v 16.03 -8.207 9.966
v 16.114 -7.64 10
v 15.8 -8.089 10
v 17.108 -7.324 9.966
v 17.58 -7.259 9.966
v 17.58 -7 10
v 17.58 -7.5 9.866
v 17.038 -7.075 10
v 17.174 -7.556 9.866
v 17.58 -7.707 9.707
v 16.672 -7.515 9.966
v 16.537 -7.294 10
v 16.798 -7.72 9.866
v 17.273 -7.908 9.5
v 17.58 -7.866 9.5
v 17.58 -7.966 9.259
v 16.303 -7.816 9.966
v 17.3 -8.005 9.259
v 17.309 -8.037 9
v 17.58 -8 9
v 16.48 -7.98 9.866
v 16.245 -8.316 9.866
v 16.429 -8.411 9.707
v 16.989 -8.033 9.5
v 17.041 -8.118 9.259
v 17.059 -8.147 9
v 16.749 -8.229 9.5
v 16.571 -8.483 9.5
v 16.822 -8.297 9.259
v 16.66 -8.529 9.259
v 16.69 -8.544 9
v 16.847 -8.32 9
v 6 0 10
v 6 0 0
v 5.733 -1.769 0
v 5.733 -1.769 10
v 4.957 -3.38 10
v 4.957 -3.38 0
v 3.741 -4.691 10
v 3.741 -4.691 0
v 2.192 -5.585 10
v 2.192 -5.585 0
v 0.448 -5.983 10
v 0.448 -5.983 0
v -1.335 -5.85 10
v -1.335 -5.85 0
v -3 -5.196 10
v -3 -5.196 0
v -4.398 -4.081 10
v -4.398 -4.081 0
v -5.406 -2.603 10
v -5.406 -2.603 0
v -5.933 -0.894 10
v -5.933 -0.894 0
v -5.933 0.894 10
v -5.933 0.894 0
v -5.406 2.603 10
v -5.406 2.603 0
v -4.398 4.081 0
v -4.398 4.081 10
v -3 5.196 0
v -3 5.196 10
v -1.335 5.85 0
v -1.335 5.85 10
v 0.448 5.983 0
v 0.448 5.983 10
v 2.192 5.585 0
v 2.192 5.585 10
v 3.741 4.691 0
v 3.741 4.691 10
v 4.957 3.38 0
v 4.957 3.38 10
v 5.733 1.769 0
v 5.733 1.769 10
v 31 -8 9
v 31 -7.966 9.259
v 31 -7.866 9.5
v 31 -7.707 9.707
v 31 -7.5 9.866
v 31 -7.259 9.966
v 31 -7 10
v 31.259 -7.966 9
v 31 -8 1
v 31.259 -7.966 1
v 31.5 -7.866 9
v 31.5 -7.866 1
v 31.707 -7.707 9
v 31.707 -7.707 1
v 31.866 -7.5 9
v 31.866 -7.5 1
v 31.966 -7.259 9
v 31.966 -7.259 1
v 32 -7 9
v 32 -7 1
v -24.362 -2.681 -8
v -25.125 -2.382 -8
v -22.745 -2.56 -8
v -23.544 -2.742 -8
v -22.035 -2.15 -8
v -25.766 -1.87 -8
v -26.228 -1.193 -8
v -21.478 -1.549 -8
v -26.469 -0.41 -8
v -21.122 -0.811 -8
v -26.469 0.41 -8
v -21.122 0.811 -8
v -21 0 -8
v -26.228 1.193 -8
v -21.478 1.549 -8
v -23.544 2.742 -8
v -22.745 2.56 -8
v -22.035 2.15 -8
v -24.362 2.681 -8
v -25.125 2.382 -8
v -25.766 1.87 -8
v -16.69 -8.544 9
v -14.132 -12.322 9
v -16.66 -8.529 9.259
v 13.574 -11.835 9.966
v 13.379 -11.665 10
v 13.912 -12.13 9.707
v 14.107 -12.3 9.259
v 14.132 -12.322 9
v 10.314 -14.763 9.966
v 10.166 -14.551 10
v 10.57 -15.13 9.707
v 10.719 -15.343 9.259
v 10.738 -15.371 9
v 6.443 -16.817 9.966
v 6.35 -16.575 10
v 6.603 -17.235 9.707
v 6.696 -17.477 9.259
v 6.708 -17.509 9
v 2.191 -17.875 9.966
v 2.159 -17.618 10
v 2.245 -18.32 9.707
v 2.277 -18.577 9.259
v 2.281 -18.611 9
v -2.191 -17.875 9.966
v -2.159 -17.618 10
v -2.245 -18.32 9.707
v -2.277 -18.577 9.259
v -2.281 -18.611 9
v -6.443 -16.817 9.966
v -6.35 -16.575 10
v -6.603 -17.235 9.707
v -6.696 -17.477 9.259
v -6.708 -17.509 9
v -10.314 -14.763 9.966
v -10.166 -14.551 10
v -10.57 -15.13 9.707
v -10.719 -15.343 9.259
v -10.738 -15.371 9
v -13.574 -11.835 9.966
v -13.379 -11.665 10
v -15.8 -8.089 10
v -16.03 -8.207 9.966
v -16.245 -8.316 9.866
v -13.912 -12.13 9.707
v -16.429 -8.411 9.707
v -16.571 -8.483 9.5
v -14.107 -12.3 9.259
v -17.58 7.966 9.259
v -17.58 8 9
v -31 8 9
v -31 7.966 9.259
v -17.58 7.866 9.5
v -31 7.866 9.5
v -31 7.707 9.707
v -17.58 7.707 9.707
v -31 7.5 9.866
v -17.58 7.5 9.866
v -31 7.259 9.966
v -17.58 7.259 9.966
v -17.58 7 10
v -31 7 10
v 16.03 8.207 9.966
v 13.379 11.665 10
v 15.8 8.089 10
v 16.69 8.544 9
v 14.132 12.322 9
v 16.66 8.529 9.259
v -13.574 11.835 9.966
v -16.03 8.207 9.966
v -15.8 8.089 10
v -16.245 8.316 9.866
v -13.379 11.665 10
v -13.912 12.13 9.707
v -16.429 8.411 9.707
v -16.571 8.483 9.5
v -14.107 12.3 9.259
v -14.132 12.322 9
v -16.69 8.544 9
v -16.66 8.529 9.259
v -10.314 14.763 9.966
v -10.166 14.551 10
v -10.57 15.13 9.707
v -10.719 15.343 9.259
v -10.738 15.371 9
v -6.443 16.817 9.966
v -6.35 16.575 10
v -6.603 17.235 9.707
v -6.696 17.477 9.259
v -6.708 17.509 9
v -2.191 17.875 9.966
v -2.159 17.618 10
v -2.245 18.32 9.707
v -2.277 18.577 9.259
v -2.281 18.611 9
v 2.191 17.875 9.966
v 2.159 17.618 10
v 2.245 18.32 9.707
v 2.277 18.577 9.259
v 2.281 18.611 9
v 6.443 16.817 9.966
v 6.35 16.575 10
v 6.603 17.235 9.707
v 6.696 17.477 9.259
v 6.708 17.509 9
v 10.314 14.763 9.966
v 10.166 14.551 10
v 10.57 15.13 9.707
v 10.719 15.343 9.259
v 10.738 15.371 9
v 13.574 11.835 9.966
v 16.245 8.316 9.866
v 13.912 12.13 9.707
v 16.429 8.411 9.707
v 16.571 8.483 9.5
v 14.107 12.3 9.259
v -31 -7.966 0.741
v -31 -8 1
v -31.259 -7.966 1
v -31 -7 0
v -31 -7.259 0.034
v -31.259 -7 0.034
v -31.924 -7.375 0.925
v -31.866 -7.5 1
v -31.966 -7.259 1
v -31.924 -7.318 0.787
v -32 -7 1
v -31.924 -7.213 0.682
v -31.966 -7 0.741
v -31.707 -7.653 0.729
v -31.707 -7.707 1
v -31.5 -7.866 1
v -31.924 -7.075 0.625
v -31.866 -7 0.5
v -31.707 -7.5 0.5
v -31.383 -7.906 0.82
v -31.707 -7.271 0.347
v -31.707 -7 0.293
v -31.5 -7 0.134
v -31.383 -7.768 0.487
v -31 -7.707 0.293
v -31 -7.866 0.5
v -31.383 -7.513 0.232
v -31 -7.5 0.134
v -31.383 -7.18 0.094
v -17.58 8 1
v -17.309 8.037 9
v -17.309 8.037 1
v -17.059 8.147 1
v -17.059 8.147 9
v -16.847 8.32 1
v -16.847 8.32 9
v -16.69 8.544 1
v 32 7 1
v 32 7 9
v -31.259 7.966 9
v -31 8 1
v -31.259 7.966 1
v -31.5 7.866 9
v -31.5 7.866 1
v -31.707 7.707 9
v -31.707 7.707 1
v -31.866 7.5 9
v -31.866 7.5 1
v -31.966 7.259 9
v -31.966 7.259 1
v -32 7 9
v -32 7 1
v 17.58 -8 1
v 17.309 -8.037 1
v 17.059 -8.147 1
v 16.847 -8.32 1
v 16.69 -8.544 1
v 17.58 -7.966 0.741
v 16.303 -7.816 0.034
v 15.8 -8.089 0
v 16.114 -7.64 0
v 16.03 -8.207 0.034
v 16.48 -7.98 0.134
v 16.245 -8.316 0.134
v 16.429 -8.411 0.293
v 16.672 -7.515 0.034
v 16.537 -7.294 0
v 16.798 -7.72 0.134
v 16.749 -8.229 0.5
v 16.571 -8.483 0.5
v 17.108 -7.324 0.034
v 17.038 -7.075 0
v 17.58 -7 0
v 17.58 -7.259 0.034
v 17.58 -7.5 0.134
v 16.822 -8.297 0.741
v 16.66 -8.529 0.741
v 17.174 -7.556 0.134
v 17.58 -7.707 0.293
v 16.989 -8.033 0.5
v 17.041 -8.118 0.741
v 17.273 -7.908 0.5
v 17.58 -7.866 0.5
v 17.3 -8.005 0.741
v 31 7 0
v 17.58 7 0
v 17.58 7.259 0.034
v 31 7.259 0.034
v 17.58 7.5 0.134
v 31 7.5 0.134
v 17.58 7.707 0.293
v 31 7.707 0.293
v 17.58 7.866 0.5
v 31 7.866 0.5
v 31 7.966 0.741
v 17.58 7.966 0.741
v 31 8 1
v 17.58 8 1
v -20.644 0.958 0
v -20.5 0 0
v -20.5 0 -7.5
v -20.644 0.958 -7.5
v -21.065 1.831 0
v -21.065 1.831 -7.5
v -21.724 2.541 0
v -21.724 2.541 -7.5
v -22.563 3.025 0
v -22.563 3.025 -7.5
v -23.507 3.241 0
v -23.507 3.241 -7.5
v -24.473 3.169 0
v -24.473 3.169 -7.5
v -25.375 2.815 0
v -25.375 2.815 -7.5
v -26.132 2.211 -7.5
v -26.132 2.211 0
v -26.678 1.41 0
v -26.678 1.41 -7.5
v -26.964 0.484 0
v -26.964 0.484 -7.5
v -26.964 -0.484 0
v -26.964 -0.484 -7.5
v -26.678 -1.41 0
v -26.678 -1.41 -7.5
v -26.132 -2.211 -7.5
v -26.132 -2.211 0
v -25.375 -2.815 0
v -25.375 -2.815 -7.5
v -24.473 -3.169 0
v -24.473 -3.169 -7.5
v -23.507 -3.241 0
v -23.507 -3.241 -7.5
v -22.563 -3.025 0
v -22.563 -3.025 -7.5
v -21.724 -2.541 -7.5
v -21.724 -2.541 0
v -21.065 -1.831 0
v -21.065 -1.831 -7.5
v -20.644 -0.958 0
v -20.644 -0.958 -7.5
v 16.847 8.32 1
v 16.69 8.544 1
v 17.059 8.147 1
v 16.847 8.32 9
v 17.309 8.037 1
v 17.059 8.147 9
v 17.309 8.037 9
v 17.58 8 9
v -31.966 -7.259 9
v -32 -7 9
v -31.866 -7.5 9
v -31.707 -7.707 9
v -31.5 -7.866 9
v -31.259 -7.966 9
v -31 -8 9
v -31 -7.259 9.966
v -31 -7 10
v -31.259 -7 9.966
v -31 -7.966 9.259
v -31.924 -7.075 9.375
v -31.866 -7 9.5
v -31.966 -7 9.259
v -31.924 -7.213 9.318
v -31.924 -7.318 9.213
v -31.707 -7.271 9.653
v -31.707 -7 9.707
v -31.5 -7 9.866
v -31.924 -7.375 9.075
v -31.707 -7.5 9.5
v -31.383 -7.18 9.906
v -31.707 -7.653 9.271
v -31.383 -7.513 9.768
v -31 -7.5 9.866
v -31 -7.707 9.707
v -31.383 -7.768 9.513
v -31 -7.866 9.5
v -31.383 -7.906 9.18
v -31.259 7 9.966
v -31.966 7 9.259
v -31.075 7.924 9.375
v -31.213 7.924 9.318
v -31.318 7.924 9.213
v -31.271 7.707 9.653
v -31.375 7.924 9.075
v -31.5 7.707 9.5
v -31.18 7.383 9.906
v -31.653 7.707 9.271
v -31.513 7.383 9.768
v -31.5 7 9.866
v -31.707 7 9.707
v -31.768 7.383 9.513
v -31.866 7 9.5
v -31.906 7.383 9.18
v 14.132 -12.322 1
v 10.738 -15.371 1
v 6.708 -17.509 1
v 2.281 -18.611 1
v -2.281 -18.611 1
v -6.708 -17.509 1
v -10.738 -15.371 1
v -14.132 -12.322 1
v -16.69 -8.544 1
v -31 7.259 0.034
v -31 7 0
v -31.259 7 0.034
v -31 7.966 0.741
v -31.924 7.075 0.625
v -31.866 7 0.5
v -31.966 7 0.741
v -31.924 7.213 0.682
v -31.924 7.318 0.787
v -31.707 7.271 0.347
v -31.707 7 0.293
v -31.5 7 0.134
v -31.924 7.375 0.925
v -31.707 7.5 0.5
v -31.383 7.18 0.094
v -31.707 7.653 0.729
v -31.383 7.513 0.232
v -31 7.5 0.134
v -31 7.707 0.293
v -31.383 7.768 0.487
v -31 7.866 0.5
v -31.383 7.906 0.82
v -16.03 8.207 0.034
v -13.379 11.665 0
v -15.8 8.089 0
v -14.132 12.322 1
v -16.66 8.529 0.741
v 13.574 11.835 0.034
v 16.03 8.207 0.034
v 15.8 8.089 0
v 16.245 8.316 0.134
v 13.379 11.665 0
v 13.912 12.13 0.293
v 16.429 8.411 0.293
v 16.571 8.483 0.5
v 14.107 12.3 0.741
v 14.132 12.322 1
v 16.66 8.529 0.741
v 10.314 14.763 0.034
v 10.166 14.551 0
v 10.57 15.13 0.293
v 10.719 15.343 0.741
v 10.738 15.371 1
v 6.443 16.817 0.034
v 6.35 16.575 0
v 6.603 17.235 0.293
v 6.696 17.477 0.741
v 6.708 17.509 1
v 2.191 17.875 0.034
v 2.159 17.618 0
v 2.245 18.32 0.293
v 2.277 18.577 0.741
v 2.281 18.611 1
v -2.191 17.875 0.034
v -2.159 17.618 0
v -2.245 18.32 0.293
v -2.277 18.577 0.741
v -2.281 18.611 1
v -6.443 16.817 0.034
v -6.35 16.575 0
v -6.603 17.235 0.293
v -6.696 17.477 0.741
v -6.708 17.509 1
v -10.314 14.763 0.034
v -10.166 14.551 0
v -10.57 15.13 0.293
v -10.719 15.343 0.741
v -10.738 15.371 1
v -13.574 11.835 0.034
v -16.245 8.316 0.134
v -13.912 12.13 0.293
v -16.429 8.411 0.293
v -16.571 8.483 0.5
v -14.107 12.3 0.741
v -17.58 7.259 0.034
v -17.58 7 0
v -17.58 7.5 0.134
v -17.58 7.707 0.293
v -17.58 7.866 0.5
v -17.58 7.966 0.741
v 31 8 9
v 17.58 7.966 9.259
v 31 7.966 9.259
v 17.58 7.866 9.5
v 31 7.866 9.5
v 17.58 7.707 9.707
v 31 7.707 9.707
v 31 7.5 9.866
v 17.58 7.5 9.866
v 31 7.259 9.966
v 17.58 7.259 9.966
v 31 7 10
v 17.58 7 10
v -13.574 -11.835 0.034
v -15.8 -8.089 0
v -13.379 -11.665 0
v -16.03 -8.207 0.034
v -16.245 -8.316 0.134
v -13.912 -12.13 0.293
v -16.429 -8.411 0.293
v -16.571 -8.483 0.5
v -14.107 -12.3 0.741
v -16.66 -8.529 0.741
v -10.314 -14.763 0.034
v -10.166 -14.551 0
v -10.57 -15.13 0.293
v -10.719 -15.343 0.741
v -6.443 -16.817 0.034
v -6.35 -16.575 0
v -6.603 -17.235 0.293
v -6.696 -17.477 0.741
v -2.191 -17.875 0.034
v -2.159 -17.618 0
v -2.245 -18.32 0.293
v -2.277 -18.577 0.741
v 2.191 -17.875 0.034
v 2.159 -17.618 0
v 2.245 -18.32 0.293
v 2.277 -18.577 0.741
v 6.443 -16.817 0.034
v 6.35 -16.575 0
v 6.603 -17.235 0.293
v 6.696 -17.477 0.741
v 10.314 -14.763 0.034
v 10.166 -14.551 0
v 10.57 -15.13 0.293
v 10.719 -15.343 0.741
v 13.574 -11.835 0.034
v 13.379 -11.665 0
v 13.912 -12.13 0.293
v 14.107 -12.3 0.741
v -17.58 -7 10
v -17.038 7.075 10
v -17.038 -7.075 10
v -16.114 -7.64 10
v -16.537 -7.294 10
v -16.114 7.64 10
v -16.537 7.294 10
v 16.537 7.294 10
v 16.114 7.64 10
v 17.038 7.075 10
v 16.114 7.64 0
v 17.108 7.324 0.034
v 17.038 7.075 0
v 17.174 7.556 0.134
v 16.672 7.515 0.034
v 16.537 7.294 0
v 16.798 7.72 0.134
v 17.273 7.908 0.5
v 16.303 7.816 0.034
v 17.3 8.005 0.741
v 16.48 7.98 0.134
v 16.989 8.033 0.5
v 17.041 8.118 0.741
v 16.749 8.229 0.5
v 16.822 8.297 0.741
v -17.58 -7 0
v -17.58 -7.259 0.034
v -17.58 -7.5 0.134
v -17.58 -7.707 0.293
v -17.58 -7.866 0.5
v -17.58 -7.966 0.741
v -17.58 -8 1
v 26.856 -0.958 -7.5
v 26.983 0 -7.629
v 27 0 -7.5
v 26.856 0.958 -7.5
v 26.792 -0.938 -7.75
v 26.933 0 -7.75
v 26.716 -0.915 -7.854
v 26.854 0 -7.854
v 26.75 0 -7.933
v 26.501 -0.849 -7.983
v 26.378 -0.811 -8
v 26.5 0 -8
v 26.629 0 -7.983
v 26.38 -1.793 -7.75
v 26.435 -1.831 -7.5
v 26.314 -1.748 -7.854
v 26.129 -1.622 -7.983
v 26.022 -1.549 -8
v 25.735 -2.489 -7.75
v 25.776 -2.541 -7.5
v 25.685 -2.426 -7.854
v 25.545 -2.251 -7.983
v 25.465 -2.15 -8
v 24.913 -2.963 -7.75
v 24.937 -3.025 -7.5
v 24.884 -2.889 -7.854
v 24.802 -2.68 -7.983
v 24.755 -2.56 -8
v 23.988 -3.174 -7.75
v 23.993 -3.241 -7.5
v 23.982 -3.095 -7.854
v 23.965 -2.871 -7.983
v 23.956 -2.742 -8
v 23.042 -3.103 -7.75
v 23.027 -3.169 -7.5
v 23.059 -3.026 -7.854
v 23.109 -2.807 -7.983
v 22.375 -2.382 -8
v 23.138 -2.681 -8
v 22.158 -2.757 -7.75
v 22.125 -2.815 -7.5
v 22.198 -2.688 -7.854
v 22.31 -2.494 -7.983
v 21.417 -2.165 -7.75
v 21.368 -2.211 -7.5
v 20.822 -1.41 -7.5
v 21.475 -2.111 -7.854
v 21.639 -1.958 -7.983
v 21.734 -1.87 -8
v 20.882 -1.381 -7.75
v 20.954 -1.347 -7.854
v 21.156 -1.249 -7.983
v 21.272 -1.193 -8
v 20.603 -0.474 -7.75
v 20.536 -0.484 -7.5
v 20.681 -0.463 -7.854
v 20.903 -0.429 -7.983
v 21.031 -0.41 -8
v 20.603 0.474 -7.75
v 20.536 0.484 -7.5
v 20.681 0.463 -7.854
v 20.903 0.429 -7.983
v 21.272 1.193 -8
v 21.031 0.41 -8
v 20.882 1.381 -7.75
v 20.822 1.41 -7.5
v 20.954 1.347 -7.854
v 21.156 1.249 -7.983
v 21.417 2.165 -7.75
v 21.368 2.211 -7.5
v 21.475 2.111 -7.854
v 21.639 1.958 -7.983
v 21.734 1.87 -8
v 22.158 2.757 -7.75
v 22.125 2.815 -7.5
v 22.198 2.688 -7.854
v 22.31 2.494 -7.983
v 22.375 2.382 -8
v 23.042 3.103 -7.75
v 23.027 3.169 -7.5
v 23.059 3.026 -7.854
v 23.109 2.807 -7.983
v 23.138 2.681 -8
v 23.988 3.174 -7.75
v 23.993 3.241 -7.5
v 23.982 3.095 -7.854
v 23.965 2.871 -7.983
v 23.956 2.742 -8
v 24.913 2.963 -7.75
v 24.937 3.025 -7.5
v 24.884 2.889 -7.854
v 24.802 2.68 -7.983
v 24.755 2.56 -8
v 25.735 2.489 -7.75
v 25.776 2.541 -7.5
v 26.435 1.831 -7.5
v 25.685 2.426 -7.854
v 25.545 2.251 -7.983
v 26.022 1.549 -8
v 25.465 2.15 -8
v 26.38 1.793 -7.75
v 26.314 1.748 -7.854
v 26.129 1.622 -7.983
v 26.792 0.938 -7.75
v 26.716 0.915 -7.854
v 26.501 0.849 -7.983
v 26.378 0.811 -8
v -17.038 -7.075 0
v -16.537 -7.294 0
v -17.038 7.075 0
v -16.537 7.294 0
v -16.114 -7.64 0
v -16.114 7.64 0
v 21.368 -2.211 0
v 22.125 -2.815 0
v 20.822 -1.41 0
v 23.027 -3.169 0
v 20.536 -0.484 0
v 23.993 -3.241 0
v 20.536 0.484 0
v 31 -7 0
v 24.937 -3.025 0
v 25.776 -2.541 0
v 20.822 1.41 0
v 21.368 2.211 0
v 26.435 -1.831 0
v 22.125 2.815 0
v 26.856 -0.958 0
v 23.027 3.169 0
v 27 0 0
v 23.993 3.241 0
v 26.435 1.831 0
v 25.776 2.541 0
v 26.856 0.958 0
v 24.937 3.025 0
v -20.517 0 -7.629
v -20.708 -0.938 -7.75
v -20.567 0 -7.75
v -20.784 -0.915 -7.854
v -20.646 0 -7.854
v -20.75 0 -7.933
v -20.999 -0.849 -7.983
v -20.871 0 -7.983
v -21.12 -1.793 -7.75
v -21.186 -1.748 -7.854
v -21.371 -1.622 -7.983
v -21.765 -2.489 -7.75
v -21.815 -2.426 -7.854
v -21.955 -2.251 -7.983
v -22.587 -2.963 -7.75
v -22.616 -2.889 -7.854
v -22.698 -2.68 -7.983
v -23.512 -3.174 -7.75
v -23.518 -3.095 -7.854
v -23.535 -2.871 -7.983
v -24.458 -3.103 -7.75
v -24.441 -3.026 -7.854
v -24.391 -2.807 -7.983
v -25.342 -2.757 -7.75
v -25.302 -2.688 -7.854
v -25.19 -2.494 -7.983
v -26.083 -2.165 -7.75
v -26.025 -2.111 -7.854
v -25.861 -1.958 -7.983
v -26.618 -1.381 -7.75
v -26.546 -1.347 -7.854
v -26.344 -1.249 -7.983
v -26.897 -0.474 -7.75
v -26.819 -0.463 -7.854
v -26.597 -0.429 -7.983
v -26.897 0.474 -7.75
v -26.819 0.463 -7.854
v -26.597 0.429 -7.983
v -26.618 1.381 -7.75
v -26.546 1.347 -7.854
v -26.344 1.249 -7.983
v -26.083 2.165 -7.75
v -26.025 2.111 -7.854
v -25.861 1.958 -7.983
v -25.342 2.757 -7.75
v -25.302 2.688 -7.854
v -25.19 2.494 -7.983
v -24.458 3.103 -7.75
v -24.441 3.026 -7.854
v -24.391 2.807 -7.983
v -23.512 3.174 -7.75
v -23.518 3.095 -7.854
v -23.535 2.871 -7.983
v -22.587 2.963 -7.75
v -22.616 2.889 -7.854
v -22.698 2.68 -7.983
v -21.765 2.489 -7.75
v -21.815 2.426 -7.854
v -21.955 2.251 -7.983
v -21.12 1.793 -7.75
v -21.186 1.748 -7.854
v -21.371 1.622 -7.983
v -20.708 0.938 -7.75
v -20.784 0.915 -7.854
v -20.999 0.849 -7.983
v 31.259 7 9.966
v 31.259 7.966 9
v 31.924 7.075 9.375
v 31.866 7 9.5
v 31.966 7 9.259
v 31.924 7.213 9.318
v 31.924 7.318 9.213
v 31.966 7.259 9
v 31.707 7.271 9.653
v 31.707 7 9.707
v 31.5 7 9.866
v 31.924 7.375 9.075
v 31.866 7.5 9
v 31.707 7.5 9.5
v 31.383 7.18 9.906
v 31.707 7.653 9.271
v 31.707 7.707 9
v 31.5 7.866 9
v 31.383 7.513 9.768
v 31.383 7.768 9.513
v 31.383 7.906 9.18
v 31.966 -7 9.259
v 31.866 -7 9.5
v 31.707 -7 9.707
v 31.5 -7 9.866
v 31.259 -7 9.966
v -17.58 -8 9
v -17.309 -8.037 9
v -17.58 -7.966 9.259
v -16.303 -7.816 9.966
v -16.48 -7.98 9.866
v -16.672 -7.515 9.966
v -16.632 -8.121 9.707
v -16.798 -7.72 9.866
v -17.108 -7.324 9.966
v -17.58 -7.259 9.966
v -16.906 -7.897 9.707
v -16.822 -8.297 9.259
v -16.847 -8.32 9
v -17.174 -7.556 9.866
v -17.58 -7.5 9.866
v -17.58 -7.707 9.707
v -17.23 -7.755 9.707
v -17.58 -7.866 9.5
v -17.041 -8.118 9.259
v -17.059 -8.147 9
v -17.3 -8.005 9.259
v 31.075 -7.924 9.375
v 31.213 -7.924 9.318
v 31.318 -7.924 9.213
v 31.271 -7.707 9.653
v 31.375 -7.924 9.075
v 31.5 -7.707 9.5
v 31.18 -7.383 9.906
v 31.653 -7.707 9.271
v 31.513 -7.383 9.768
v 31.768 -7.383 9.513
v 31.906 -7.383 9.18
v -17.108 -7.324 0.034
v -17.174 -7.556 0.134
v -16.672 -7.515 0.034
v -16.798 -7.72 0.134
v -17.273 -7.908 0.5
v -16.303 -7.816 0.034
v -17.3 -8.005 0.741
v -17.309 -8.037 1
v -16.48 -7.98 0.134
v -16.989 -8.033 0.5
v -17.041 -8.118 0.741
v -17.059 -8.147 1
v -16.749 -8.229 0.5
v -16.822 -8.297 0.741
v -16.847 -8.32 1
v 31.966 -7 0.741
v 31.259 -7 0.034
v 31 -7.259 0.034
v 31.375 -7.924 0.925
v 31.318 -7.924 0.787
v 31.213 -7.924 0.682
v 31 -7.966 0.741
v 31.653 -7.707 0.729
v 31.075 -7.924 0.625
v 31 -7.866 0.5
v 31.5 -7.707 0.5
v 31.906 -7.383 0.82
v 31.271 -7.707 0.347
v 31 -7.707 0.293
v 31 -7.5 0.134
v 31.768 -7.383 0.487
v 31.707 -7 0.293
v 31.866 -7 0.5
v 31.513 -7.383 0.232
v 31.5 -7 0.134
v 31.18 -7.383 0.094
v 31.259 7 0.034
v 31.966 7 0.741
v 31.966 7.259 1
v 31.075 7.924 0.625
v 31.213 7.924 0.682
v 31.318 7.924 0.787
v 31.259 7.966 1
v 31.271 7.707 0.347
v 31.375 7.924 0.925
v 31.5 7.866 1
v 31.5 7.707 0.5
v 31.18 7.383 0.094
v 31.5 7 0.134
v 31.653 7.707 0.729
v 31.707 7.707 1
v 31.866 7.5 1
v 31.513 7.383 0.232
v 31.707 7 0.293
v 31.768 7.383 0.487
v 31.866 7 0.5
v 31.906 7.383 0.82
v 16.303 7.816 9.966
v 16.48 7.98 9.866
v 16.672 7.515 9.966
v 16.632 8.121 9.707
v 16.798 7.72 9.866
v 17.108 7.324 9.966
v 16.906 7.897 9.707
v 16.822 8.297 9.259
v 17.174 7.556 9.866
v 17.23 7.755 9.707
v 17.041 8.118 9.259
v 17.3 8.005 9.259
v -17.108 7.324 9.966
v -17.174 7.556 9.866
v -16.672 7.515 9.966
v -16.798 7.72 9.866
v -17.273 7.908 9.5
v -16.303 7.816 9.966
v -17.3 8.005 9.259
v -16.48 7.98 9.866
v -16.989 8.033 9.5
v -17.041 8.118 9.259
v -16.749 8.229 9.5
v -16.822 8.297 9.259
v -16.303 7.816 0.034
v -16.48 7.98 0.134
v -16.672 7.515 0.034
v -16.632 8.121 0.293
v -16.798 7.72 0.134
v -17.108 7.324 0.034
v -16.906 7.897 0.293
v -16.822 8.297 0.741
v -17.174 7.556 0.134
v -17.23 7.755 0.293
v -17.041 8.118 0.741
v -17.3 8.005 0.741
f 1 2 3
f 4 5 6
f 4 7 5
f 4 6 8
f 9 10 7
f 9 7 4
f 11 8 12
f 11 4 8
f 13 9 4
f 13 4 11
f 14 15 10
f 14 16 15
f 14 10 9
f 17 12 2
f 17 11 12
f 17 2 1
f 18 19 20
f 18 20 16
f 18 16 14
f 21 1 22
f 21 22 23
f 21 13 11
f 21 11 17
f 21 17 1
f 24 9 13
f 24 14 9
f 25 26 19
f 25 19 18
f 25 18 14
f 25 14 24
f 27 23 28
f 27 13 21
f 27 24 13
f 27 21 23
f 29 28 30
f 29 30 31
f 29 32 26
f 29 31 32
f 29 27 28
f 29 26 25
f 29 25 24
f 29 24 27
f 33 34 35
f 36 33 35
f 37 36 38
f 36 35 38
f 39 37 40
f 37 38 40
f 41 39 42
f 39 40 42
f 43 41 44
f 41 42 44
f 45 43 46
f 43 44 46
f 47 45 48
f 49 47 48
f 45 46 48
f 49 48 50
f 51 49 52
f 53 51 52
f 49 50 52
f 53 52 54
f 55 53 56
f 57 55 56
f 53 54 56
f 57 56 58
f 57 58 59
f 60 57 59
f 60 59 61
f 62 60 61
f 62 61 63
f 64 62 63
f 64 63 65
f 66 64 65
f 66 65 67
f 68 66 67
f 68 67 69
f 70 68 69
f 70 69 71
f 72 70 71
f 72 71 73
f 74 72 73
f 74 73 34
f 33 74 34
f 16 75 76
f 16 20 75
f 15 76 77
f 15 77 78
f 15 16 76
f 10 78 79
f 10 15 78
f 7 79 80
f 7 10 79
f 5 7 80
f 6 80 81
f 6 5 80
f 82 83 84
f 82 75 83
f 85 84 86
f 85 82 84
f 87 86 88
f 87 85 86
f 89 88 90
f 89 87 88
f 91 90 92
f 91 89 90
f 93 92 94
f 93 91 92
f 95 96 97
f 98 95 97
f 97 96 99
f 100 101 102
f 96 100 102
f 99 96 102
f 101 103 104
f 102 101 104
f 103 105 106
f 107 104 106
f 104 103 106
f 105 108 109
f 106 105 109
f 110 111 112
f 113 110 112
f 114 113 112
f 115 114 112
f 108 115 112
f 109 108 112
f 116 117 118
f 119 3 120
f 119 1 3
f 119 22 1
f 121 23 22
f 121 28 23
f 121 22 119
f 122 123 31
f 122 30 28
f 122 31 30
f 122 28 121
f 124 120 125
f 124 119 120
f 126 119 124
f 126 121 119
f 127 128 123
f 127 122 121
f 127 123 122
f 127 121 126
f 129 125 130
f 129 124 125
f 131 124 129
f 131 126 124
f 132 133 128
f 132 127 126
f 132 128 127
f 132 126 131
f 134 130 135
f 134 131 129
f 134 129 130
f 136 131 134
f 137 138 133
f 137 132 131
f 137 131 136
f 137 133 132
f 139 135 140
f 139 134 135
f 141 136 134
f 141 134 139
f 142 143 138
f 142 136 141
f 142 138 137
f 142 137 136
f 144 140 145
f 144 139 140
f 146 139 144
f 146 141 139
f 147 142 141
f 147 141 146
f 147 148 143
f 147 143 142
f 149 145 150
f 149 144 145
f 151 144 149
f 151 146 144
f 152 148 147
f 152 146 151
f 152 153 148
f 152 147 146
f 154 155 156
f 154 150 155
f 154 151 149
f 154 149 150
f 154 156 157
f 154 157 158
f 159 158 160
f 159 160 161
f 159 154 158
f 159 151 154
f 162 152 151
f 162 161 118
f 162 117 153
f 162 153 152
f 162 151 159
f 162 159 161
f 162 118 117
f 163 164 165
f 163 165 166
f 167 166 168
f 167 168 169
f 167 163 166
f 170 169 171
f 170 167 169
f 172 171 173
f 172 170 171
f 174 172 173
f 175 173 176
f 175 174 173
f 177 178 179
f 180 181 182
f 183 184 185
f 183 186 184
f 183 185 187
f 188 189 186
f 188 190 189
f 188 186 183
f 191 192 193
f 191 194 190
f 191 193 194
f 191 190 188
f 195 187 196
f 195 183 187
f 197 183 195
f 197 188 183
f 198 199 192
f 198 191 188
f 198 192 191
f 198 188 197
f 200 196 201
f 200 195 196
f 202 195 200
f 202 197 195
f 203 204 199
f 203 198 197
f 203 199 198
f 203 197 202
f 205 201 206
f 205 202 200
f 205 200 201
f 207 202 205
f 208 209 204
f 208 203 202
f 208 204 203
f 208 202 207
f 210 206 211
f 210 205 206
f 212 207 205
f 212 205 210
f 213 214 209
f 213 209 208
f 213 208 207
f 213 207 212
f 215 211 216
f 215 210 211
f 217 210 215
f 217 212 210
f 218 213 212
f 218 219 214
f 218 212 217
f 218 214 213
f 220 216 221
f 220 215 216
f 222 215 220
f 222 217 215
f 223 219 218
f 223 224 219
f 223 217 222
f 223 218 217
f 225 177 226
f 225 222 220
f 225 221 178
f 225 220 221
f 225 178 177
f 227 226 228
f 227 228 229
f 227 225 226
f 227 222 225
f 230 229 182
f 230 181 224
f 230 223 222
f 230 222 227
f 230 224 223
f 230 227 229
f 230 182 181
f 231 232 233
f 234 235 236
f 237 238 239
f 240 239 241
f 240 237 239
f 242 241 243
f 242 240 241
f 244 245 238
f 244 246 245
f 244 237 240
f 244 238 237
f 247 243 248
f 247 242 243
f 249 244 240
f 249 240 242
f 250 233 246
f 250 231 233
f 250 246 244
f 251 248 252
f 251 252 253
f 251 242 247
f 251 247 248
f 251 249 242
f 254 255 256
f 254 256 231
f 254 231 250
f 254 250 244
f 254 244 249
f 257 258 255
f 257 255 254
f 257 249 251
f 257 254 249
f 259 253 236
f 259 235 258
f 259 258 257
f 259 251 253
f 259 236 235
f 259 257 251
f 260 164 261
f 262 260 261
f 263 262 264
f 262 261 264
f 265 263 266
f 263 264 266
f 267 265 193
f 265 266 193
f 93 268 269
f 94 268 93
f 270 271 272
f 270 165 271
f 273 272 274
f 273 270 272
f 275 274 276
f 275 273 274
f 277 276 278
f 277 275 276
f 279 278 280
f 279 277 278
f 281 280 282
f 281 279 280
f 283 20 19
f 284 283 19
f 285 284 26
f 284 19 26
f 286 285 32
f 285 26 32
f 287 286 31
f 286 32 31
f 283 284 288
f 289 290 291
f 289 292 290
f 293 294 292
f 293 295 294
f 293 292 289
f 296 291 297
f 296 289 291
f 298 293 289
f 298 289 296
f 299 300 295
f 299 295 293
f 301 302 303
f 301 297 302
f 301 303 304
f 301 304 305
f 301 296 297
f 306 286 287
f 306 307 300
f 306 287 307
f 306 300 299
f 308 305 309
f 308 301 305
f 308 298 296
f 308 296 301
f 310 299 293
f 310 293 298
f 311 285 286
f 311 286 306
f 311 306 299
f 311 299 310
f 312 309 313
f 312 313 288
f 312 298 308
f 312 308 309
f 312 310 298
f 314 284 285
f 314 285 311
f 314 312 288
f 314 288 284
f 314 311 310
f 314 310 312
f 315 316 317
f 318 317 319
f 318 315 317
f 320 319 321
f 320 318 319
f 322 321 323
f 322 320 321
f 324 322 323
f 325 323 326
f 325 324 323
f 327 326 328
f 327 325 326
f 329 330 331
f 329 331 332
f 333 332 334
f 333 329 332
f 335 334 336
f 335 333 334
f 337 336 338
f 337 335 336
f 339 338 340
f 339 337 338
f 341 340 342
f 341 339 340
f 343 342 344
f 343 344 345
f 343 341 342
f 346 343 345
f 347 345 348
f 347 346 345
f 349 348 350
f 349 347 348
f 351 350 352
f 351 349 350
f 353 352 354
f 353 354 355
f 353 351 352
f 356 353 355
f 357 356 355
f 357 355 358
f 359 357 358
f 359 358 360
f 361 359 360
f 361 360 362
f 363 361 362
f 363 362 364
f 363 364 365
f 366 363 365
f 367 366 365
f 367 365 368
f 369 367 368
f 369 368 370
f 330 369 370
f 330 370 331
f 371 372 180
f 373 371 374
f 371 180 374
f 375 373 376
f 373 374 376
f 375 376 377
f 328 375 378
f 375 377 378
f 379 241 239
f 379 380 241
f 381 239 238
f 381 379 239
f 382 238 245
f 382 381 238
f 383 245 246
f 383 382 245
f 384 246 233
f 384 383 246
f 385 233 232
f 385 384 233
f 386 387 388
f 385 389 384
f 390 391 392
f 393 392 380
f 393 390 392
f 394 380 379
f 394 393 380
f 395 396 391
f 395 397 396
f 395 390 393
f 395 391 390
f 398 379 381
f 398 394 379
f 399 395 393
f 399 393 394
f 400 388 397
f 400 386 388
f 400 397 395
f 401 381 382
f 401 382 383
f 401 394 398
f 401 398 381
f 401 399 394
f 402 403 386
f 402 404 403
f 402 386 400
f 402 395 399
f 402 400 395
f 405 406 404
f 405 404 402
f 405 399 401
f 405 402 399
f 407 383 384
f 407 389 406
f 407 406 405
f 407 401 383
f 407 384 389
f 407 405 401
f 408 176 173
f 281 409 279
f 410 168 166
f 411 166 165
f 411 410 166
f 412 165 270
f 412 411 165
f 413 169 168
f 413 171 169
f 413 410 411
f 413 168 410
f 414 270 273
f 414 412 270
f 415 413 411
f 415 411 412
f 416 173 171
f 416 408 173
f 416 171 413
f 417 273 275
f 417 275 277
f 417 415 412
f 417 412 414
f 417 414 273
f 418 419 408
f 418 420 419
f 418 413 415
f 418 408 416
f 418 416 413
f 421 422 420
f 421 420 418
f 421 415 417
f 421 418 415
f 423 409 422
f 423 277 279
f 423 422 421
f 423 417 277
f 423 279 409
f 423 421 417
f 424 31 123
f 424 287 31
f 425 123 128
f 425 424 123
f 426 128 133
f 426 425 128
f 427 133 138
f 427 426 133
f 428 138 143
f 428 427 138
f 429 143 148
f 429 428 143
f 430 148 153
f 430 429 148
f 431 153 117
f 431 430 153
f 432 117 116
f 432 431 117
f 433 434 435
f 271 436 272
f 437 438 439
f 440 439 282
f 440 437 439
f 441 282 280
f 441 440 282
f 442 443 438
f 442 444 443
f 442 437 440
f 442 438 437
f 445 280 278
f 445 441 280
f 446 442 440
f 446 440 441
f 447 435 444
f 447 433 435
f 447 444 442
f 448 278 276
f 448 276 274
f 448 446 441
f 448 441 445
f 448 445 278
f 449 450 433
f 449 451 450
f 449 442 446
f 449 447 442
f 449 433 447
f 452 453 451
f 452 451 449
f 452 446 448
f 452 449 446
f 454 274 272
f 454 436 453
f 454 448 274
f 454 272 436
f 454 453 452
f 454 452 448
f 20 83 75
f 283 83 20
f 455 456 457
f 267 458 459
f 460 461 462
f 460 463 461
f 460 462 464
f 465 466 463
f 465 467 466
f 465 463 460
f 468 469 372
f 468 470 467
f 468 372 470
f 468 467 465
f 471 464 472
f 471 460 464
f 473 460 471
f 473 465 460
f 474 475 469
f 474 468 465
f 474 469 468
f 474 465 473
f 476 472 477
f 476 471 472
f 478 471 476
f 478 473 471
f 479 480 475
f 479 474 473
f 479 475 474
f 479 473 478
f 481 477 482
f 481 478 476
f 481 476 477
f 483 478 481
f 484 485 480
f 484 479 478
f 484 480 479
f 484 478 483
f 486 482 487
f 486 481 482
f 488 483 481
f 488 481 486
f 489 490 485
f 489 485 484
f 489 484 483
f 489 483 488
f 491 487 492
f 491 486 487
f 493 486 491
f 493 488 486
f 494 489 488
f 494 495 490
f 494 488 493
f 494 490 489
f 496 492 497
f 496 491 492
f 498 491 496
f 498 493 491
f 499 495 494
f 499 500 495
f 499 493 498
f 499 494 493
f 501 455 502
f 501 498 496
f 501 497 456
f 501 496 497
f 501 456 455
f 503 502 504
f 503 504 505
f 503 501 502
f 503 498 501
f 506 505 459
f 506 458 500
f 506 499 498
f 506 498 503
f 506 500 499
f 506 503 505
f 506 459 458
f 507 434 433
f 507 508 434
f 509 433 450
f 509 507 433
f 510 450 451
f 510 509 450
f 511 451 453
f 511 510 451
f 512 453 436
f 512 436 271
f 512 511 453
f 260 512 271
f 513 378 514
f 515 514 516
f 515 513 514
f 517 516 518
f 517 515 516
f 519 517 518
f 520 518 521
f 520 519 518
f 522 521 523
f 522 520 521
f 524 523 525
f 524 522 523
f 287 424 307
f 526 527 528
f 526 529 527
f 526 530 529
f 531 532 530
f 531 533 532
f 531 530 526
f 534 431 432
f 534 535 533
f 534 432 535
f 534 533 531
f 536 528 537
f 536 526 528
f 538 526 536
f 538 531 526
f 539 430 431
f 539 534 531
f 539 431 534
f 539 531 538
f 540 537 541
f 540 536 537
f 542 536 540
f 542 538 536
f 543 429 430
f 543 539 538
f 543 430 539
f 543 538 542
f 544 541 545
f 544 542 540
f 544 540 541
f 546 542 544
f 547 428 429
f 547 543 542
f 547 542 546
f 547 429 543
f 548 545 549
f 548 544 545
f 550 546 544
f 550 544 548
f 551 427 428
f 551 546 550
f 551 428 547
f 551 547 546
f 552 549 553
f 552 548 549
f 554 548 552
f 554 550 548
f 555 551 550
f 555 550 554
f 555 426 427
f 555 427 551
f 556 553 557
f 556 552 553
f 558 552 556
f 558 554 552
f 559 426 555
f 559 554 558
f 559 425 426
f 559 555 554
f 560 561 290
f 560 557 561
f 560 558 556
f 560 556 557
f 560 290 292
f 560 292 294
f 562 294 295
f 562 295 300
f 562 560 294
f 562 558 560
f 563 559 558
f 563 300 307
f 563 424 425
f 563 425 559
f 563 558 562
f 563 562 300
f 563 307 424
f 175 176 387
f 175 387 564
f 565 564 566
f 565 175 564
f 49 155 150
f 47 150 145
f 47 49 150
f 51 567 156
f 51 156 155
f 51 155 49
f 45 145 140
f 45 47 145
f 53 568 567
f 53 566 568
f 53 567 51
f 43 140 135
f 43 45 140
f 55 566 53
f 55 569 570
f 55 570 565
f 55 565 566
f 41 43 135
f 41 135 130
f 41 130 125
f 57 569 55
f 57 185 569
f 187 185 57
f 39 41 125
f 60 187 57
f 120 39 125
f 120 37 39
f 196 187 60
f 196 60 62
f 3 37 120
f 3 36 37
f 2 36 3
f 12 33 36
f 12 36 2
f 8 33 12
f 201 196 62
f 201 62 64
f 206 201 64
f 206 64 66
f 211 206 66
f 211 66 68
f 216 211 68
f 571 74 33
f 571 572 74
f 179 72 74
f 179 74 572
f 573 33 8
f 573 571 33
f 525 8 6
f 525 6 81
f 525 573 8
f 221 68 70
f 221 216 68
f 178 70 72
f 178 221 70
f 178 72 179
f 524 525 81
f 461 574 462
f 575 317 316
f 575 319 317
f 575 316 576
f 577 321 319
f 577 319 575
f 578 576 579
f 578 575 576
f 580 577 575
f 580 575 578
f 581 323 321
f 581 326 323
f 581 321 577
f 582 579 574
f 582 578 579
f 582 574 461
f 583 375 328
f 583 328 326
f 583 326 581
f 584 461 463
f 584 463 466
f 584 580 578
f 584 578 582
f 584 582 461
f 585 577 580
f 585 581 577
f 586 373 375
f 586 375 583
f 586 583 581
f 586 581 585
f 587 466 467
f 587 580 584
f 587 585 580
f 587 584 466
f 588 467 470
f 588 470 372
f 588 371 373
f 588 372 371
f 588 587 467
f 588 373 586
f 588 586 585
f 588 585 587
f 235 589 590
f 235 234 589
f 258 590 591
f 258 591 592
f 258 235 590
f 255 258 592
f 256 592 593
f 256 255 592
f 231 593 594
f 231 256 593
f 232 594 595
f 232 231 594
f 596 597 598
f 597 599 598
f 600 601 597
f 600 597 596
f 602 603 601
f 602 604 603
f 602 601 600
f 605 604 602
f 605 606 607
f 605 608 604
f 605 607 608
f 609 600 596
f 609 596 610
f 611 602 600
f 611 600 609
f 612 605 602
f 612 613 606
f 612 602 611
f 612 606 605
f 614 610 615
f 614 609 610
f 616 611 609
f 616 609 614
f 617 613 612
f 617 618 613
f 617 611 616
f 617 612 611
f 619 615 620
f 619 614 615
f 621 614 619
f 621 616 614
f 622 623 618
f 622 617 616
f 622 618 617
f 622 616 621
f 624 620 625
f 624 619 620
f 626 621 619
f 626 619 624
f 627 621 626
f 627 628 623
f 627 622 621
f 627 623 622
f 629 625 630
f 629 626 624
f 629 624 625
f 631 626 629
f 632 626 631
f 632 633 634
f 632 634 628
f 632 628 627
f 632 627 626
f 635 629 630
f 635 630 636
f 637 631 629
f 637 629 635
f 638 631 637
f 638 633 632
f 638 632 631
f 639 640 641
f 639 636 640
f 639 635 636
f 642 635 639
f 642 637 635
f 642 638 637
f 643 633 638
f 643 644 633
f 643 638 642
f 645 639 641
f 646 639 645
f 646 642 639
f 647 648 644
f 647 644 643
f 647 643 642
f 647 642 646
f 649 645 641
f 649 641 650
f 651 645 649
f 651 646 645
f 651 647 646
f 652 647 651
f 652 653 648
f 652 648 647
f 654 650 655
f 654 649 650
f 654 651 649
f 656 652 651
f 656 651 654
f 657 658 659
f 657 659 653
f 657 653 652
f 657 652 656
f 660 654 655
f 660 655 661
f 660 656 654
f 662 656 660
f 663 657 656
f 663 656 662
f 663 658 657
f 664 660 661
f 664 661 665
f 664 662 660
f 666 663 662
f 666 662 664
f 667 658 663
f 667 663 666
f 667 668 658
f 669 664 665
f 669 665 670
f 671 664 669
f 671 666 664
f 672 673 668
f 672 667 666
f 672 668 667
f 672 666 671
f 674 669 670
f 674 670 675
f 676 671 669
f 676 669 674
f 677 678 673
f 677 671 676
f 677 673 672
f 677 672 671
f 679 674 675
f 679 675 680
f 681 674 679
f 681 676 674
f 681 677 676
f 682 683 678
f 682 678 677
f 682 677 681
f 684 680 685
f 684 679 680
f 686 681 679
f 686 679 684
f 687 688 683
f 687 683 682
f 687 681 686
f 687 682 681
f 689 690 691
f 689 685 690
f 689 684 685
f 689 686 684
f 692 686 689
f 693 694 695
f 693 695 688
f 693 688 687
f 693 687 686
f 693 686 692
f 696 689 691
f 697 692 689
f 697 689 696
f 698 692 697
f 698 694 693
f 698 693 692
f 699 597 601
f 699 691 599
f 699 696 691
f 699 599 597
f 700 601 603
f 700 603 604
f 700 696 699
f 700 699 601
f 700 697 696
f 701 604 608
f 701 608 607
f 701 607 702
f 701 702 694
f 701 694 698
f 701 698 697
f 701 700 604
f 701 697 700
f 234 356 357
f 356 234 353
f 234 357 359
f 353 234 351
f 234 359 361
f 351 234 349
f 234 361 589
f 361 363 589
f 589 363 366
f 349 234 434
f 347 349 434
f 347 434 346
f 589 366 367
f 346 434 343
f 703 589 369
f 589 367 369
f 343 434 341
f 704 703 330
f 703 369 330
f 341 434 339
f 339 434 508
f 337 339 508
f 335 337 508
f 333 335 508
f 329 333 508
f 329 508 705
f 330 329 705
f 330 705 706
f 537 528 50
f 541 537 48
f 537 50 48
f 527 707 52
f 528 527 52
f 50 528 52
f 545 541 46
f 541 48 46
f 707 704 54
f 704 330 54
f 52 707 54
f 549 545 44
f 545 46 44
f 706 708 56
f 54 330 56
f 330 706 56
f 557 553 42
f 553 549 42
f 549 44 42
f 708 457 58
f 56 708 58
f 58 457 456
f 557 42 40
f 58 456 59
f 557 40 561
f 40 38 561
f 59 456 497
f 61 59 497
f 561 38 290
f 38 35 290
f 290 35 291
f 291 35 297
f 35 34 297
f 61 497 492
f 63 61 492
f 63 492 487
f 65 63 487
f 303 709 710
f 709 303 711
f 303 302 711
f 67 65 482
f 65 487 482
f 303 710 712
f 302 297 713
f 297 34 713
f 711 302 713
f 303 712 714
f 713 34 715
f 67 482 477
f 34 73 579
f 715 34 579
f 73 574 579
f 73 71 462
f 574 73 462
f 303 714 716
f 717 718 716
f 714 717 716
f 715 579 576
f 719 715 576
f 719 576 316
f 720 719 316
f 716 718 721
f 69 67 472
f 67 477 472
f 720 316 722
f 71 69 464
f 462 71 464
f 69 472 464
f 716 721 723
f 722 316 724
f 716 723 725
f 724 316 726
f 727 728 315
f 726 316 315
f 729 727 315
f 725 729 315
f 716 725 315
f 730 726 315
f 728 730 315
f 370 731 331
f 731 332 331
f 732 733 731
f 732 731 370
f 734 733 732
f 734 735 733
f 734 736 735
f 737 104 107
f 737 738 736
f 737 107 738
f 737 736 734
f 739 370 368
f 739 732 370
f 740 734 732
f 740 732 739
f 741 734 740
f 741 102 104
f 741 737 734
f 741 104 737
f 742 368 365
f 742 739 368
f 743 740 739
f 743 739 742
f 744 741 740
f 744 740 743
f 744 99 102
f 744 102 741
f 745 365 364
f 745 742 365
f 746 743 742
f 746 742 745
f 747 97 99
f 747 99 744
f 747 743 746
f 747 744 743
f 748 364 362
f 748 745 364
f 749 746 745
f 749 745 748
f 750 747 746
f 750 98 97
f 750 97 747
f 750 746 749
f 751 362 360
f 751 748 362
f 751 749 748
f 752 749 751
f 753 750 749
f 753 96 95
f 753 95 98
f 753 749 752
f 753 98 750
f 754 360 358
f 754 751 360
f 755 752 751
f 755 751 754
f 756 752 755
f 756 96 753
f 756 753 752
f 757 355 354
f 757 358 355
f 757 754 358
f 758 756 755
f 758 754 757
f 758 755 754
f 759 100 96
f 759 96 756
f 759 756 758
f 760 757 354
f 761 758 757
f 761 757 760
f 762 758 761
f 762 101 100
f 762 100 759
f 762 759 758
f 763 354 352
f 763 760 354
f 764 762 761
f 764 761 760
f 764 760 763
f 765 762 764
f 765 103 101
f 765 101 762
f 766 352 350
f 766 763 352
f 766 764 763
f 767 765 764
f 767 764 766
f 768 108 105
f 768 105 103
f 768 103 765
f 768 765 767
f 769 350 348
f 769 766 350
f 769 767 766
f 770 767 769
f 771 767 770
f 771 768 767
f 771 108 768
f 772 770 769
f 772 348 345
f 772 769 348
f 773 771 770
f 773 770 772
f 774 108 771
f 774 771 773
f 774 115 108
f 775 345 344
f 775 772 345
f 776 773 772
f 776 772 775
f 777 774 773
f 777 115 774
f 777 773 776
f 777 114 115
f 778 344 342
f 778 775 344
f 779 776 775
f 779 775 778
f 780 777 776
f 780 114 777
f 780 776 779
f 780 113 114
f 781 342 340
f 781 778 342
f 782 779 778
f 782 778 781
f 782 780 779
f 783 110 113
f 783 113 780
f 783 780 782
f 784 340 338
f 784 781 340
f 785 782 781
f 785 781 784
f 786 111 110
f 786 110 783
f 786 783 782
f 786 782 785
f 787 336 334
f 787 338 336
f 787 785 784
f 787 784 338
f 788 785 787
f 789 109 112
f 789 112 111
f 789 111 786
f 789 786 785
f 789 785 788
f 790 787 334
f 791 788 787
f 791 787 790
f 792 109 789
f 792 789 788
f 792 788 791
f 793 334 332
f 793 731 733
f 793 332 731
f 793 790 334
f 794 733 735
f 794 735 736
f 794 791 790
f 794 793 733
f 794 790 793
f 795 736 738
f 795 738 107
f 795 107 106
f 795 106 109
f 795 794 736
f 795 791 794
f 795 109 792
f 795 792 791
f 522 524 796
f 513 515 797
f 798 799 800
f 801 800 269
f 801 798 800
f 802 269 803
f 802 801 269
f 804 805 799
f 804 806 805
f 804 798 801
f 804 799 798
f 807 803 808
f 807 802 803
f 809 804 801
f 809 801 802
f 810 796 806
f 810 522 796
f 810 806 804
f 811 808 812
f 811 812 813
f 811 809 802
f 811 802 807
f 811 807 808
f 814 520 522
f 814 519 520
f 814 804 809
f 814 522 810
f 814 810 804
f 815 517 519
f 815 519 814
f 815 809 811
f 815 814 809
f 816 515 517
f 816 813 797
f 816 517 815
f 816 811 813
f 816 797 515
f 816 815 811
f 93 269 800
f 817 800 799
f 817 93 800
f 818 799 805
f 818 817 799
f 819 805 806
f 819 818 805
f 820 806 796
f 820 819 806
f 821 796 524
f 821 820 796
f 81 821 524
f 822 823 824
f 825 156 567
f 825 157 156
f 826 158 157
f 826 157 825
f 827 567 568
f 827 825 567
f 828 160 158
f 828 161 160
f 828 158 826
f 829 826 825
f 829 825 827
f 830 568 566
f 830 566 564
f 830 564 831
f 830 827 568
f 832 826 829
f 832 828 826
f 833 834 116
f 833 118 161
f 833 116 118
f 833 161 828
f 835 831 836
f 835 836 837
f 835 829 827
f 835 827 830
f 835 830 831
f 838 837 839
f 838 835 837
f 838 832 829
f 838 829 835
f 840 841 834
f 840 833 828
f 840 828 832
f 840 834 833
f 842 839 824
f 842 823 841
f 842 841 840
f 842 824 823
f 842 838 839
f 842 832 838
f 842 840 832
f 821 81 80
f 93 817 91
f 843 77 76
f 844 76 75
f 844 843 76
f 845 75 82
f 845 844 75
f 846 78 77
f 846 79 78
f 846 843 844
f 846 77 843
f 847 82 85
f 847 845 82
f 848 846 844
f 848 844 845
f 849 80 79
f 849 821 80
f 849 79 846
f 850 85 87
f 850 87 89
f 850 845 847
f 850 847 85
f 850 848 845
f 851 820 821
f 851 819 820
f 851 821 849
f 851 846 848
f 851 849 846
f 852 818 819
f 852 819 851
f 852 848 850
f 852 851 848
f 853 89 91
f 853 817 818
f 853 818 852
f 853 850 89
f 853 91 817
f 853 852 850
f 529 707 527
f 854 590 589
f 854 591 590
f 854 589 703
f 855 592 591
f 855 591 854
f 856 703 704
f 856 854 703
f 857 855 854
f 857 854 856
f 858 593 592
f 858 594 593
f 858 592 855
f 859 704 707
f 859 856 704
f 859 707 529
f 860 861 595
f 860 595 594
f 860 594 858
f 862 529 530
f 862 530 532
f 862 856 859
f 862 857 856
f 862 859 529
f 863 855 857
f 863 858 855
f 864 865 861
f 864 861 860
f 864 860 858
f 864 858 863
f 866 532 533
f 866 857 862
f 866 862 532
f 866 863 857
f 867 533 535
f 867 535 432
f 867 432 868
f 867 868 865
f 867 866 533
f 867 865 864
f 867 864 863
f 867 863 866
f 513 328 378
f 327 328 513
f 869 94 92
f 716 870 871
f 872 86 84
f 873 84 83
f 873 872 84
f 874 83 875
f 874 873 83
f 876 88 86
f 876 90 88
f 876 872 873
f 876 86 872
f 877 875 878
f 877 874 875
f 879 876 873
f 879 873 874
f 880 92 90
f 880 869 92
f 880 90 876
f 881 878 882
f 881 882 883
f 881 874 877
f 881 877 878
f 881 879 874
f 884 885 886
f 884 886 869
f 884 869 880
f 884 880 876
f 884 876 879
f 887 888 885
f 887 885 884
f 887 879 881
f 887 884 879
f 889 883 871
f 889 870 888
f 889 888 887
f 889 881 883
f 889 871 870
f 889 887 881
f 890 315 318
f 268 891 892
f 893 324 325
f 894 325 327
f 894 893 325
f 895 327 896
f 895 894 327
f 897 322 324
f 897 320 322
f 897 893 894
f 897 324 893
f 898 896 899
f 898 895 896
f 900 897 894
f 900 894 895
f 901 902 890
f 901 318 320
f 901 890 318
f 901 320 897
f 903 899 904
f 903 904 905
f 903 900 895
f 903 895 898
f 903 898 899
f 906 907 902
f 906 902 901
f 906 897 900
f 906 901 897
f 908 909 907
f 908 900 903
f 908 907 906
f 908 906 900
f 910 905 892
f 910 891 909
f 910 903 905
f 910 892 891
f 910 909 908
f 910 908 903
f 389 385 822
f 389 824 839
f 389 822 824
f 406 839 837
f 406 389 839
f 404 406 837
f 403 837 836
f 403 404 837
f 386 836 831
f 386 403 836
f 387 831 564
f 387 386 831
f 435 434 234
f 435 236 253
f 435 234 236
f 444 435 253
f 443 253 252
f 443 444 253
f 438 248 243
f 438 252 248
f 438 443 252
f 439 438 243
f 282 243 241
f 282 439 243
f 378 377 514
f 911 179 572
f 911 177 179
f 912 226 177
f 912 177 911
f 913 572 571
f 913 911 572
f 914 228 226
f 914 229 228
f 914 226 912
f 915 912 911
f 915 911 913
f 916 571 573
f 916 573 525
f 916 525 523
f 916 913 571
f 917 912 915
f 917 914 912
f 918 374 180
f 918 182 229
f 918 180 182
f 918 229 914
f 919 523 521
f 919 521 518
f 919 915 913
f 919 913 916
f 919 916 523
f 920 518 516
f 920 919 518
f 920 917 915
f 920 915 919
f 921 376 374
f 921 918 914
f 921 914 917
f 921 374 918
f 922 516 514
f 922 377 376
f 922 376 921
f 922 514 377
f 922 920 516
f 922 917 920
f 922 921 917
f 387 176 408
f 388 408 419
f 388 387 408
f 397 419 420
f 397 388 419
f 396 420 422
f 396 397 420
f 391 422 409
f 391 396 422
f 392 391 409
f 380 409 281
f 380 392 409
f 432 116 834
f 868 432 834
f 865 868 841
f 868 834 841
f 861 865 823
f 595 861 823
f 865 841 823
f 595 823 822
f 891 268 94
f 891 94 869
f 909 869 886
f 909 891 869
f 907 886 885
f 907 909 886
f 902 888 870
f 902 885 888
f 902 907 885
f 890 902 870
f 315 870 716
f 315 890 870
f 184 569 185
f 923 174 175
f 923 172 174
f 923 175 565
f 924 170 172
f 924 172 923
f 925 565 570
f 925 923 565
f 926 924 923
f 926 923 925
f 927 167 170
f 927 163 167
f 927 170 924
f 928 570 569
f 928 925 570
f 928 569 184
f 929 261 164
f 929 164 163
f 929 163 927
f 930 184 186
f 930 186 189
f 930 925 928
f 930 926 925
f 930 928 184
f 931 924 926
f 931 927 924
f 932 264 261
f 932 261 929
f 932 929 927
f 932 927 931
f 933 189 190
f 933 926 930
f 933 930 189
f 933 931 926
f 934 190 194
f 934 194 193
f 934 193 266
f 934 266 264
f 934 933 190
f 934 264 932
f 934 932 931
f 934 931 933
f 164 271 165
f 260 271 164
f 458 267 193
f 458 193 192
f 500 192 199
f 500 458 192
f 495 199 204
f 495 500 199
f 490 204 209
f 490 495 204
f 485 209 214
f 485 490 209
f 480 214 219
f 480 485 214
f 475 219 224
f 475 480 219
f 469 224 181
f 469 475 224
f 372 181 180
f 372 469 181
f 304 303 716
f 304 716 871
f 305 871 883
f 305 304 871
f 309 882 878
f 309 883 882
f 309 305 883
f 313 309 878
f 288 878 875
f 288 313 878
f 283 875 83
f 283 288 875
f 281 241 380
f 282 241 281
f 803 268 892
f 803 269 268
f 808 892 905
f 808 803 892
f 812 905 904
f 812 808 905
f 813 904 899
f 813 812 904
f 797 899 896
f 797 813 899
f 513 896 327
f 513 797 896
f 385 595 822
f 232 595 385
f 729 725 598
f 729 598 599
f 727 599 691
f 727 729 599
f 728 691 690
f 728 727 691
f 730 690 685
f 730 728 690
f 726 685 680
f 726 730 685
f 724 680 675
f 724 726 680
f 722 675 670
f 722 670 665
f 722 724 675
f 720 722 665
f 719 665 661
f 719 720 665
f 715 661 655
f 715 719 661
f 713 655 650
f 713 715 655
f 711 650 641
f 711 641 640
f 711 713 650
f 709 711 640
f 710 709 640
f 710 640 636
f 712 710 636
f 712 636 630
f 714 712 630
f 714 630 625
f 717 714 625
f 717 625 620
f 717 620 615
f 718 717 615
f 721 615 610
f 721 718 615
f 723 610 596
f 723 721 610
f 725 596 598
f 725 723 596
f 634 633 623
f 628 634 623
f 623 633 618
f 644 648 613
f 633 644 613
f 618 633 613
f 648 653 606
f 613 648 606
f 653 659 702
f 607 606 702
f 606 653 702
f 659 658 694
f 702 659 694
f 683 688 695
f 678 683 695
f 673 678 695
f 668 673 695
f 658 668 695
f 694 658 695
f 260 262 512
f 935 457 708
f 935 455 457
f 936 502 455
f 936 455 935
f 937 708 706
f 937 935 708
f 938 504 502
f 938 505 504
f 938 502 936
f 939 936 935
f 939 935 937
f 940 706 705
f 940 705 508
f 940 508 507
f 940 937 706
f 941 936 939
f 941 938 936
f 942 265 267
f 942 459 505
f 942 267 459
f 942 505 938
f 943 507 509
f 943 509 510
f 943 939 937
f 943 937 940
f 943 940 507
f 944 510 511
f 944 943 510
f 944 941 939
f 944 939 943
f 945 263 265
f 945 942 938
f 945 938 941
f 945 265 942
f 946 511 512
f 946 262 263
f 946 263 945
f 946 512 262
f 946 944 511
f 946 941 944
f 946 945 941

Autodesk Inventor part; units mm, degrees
ref_plane "YZ Plane" through (0, 0, 0) normal (1, 0, 0) x (0, 1, 0)
ref_plane "XZ Plane" through (0, 0, 0) normal (0, 1, 0) x (-1, 0, 0)
ref_plane "XY Plane" through (0, 0, 0) normal (0, 0, 1) x (1, 0, 0)
sketch "Sketch1" plane through (0, 0, 0) normal (0, 0, 1) x (1, 0, 0)
  circle A0 centre (0, 0) radius 6
  circle A1 centre (-23.75, 0) radius 3.25
  line L0 (-20.5, 0) -> (-20.5, 3.4324)
  line L1 (-27, 0) -> (-27, 3.2184)
  line L2 (-44.8, 0) -> (44.8, 0) projected
  line L3 (0, 26.25) -> (0, -26.25) projected
  circle A2 centre (23.75, 0) radius 3.25
  line L4 (32, 8) -> (32, -8)
  line L5 (-32, -8) -> (-32, 8)
  arc A3 (-16.9577, -8) -> (16.9577, -8) centre (0, 0) ccw
  arc A4 (16.9577, 8) -> (-16.9577, 8) centre (0, 0) ccw
  line L6 (32, -8) -> (16.9577, -8)
  line L7 (-16.9577, -8) -> (-32, -8)
  line L8 (-32, 8) -> (-16.9577, 8)
  line L9 (16.9577, 8) -> (32, 8)
  dimension "d0" = 12
  dimension "d4" = 20.5
  dimension "d5" = 27
  dimension "d9" = 5
  dimension "d10" = 18.75
  dimension "d11" = 18.75
extrude "Extrusion1" add sketch "Sketch1" along normal blind 10 contours L2 A2 L4 L6 A3 L3 A0 | A0 L3 A4 L9 L4 L2 A2 | A0 L2 A1 L5 L8 A4 L3 | L3 A3 L7 L5 L2 A1 A0 | A2 L2 | L2 A2 | L2 A1 | A1 L2
extrude "Extrusion2" add sketch "Sketch1" against normal blind 8 contours A2 L2 | L2 A2 | L2 A1 | A1 L2
fillet "Fillet1" radius 1 24 edges at (0, 18.75, 10) (24.4788, 8, 10) (32, 0, 10) (24.4788, -8, 10) (0, -18.75, 10) (-24.4788, -8, 10) (-32, 0, 10) (-24.4788, 8, 10) (32, 0, 0) (24.4788, 8, 0) (0, 18.75, 0) (24.4788, -8, 0) (0, -18.75, 0) (-24.4788, -8, 0) (-24.4788, 8, 0) (-32, 0, 0) (-32, -8, 5) (-32, 8, 5) (32, 8, 5) (32, -8, 5) (16.9577, -8, 5) (-16.9577, -8, 5) (-16.9577, 8, 5) (16.9577, 8, 5)
fillet "Fillet3" radius 0.5 2 edges at (20.5, 0, -8) (-27, 0, -8)
thread "Thread1" size "M12x1.5" class "6H" standard "ANSI Metric M Profile" full length
properties part number "Steering Front"
